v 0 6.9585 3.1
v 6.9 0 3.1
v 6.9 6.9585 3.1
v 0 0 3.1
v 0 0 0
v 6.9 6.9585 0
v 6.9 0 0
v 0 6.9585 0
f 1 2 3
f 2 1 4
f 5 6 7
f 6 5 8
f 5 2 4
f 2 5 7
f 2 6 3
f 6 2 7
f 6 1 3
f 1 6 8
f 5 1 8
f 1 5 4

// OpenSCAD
use <../../../modules/leverless_pws_blaze.scad>

nut_plug();
